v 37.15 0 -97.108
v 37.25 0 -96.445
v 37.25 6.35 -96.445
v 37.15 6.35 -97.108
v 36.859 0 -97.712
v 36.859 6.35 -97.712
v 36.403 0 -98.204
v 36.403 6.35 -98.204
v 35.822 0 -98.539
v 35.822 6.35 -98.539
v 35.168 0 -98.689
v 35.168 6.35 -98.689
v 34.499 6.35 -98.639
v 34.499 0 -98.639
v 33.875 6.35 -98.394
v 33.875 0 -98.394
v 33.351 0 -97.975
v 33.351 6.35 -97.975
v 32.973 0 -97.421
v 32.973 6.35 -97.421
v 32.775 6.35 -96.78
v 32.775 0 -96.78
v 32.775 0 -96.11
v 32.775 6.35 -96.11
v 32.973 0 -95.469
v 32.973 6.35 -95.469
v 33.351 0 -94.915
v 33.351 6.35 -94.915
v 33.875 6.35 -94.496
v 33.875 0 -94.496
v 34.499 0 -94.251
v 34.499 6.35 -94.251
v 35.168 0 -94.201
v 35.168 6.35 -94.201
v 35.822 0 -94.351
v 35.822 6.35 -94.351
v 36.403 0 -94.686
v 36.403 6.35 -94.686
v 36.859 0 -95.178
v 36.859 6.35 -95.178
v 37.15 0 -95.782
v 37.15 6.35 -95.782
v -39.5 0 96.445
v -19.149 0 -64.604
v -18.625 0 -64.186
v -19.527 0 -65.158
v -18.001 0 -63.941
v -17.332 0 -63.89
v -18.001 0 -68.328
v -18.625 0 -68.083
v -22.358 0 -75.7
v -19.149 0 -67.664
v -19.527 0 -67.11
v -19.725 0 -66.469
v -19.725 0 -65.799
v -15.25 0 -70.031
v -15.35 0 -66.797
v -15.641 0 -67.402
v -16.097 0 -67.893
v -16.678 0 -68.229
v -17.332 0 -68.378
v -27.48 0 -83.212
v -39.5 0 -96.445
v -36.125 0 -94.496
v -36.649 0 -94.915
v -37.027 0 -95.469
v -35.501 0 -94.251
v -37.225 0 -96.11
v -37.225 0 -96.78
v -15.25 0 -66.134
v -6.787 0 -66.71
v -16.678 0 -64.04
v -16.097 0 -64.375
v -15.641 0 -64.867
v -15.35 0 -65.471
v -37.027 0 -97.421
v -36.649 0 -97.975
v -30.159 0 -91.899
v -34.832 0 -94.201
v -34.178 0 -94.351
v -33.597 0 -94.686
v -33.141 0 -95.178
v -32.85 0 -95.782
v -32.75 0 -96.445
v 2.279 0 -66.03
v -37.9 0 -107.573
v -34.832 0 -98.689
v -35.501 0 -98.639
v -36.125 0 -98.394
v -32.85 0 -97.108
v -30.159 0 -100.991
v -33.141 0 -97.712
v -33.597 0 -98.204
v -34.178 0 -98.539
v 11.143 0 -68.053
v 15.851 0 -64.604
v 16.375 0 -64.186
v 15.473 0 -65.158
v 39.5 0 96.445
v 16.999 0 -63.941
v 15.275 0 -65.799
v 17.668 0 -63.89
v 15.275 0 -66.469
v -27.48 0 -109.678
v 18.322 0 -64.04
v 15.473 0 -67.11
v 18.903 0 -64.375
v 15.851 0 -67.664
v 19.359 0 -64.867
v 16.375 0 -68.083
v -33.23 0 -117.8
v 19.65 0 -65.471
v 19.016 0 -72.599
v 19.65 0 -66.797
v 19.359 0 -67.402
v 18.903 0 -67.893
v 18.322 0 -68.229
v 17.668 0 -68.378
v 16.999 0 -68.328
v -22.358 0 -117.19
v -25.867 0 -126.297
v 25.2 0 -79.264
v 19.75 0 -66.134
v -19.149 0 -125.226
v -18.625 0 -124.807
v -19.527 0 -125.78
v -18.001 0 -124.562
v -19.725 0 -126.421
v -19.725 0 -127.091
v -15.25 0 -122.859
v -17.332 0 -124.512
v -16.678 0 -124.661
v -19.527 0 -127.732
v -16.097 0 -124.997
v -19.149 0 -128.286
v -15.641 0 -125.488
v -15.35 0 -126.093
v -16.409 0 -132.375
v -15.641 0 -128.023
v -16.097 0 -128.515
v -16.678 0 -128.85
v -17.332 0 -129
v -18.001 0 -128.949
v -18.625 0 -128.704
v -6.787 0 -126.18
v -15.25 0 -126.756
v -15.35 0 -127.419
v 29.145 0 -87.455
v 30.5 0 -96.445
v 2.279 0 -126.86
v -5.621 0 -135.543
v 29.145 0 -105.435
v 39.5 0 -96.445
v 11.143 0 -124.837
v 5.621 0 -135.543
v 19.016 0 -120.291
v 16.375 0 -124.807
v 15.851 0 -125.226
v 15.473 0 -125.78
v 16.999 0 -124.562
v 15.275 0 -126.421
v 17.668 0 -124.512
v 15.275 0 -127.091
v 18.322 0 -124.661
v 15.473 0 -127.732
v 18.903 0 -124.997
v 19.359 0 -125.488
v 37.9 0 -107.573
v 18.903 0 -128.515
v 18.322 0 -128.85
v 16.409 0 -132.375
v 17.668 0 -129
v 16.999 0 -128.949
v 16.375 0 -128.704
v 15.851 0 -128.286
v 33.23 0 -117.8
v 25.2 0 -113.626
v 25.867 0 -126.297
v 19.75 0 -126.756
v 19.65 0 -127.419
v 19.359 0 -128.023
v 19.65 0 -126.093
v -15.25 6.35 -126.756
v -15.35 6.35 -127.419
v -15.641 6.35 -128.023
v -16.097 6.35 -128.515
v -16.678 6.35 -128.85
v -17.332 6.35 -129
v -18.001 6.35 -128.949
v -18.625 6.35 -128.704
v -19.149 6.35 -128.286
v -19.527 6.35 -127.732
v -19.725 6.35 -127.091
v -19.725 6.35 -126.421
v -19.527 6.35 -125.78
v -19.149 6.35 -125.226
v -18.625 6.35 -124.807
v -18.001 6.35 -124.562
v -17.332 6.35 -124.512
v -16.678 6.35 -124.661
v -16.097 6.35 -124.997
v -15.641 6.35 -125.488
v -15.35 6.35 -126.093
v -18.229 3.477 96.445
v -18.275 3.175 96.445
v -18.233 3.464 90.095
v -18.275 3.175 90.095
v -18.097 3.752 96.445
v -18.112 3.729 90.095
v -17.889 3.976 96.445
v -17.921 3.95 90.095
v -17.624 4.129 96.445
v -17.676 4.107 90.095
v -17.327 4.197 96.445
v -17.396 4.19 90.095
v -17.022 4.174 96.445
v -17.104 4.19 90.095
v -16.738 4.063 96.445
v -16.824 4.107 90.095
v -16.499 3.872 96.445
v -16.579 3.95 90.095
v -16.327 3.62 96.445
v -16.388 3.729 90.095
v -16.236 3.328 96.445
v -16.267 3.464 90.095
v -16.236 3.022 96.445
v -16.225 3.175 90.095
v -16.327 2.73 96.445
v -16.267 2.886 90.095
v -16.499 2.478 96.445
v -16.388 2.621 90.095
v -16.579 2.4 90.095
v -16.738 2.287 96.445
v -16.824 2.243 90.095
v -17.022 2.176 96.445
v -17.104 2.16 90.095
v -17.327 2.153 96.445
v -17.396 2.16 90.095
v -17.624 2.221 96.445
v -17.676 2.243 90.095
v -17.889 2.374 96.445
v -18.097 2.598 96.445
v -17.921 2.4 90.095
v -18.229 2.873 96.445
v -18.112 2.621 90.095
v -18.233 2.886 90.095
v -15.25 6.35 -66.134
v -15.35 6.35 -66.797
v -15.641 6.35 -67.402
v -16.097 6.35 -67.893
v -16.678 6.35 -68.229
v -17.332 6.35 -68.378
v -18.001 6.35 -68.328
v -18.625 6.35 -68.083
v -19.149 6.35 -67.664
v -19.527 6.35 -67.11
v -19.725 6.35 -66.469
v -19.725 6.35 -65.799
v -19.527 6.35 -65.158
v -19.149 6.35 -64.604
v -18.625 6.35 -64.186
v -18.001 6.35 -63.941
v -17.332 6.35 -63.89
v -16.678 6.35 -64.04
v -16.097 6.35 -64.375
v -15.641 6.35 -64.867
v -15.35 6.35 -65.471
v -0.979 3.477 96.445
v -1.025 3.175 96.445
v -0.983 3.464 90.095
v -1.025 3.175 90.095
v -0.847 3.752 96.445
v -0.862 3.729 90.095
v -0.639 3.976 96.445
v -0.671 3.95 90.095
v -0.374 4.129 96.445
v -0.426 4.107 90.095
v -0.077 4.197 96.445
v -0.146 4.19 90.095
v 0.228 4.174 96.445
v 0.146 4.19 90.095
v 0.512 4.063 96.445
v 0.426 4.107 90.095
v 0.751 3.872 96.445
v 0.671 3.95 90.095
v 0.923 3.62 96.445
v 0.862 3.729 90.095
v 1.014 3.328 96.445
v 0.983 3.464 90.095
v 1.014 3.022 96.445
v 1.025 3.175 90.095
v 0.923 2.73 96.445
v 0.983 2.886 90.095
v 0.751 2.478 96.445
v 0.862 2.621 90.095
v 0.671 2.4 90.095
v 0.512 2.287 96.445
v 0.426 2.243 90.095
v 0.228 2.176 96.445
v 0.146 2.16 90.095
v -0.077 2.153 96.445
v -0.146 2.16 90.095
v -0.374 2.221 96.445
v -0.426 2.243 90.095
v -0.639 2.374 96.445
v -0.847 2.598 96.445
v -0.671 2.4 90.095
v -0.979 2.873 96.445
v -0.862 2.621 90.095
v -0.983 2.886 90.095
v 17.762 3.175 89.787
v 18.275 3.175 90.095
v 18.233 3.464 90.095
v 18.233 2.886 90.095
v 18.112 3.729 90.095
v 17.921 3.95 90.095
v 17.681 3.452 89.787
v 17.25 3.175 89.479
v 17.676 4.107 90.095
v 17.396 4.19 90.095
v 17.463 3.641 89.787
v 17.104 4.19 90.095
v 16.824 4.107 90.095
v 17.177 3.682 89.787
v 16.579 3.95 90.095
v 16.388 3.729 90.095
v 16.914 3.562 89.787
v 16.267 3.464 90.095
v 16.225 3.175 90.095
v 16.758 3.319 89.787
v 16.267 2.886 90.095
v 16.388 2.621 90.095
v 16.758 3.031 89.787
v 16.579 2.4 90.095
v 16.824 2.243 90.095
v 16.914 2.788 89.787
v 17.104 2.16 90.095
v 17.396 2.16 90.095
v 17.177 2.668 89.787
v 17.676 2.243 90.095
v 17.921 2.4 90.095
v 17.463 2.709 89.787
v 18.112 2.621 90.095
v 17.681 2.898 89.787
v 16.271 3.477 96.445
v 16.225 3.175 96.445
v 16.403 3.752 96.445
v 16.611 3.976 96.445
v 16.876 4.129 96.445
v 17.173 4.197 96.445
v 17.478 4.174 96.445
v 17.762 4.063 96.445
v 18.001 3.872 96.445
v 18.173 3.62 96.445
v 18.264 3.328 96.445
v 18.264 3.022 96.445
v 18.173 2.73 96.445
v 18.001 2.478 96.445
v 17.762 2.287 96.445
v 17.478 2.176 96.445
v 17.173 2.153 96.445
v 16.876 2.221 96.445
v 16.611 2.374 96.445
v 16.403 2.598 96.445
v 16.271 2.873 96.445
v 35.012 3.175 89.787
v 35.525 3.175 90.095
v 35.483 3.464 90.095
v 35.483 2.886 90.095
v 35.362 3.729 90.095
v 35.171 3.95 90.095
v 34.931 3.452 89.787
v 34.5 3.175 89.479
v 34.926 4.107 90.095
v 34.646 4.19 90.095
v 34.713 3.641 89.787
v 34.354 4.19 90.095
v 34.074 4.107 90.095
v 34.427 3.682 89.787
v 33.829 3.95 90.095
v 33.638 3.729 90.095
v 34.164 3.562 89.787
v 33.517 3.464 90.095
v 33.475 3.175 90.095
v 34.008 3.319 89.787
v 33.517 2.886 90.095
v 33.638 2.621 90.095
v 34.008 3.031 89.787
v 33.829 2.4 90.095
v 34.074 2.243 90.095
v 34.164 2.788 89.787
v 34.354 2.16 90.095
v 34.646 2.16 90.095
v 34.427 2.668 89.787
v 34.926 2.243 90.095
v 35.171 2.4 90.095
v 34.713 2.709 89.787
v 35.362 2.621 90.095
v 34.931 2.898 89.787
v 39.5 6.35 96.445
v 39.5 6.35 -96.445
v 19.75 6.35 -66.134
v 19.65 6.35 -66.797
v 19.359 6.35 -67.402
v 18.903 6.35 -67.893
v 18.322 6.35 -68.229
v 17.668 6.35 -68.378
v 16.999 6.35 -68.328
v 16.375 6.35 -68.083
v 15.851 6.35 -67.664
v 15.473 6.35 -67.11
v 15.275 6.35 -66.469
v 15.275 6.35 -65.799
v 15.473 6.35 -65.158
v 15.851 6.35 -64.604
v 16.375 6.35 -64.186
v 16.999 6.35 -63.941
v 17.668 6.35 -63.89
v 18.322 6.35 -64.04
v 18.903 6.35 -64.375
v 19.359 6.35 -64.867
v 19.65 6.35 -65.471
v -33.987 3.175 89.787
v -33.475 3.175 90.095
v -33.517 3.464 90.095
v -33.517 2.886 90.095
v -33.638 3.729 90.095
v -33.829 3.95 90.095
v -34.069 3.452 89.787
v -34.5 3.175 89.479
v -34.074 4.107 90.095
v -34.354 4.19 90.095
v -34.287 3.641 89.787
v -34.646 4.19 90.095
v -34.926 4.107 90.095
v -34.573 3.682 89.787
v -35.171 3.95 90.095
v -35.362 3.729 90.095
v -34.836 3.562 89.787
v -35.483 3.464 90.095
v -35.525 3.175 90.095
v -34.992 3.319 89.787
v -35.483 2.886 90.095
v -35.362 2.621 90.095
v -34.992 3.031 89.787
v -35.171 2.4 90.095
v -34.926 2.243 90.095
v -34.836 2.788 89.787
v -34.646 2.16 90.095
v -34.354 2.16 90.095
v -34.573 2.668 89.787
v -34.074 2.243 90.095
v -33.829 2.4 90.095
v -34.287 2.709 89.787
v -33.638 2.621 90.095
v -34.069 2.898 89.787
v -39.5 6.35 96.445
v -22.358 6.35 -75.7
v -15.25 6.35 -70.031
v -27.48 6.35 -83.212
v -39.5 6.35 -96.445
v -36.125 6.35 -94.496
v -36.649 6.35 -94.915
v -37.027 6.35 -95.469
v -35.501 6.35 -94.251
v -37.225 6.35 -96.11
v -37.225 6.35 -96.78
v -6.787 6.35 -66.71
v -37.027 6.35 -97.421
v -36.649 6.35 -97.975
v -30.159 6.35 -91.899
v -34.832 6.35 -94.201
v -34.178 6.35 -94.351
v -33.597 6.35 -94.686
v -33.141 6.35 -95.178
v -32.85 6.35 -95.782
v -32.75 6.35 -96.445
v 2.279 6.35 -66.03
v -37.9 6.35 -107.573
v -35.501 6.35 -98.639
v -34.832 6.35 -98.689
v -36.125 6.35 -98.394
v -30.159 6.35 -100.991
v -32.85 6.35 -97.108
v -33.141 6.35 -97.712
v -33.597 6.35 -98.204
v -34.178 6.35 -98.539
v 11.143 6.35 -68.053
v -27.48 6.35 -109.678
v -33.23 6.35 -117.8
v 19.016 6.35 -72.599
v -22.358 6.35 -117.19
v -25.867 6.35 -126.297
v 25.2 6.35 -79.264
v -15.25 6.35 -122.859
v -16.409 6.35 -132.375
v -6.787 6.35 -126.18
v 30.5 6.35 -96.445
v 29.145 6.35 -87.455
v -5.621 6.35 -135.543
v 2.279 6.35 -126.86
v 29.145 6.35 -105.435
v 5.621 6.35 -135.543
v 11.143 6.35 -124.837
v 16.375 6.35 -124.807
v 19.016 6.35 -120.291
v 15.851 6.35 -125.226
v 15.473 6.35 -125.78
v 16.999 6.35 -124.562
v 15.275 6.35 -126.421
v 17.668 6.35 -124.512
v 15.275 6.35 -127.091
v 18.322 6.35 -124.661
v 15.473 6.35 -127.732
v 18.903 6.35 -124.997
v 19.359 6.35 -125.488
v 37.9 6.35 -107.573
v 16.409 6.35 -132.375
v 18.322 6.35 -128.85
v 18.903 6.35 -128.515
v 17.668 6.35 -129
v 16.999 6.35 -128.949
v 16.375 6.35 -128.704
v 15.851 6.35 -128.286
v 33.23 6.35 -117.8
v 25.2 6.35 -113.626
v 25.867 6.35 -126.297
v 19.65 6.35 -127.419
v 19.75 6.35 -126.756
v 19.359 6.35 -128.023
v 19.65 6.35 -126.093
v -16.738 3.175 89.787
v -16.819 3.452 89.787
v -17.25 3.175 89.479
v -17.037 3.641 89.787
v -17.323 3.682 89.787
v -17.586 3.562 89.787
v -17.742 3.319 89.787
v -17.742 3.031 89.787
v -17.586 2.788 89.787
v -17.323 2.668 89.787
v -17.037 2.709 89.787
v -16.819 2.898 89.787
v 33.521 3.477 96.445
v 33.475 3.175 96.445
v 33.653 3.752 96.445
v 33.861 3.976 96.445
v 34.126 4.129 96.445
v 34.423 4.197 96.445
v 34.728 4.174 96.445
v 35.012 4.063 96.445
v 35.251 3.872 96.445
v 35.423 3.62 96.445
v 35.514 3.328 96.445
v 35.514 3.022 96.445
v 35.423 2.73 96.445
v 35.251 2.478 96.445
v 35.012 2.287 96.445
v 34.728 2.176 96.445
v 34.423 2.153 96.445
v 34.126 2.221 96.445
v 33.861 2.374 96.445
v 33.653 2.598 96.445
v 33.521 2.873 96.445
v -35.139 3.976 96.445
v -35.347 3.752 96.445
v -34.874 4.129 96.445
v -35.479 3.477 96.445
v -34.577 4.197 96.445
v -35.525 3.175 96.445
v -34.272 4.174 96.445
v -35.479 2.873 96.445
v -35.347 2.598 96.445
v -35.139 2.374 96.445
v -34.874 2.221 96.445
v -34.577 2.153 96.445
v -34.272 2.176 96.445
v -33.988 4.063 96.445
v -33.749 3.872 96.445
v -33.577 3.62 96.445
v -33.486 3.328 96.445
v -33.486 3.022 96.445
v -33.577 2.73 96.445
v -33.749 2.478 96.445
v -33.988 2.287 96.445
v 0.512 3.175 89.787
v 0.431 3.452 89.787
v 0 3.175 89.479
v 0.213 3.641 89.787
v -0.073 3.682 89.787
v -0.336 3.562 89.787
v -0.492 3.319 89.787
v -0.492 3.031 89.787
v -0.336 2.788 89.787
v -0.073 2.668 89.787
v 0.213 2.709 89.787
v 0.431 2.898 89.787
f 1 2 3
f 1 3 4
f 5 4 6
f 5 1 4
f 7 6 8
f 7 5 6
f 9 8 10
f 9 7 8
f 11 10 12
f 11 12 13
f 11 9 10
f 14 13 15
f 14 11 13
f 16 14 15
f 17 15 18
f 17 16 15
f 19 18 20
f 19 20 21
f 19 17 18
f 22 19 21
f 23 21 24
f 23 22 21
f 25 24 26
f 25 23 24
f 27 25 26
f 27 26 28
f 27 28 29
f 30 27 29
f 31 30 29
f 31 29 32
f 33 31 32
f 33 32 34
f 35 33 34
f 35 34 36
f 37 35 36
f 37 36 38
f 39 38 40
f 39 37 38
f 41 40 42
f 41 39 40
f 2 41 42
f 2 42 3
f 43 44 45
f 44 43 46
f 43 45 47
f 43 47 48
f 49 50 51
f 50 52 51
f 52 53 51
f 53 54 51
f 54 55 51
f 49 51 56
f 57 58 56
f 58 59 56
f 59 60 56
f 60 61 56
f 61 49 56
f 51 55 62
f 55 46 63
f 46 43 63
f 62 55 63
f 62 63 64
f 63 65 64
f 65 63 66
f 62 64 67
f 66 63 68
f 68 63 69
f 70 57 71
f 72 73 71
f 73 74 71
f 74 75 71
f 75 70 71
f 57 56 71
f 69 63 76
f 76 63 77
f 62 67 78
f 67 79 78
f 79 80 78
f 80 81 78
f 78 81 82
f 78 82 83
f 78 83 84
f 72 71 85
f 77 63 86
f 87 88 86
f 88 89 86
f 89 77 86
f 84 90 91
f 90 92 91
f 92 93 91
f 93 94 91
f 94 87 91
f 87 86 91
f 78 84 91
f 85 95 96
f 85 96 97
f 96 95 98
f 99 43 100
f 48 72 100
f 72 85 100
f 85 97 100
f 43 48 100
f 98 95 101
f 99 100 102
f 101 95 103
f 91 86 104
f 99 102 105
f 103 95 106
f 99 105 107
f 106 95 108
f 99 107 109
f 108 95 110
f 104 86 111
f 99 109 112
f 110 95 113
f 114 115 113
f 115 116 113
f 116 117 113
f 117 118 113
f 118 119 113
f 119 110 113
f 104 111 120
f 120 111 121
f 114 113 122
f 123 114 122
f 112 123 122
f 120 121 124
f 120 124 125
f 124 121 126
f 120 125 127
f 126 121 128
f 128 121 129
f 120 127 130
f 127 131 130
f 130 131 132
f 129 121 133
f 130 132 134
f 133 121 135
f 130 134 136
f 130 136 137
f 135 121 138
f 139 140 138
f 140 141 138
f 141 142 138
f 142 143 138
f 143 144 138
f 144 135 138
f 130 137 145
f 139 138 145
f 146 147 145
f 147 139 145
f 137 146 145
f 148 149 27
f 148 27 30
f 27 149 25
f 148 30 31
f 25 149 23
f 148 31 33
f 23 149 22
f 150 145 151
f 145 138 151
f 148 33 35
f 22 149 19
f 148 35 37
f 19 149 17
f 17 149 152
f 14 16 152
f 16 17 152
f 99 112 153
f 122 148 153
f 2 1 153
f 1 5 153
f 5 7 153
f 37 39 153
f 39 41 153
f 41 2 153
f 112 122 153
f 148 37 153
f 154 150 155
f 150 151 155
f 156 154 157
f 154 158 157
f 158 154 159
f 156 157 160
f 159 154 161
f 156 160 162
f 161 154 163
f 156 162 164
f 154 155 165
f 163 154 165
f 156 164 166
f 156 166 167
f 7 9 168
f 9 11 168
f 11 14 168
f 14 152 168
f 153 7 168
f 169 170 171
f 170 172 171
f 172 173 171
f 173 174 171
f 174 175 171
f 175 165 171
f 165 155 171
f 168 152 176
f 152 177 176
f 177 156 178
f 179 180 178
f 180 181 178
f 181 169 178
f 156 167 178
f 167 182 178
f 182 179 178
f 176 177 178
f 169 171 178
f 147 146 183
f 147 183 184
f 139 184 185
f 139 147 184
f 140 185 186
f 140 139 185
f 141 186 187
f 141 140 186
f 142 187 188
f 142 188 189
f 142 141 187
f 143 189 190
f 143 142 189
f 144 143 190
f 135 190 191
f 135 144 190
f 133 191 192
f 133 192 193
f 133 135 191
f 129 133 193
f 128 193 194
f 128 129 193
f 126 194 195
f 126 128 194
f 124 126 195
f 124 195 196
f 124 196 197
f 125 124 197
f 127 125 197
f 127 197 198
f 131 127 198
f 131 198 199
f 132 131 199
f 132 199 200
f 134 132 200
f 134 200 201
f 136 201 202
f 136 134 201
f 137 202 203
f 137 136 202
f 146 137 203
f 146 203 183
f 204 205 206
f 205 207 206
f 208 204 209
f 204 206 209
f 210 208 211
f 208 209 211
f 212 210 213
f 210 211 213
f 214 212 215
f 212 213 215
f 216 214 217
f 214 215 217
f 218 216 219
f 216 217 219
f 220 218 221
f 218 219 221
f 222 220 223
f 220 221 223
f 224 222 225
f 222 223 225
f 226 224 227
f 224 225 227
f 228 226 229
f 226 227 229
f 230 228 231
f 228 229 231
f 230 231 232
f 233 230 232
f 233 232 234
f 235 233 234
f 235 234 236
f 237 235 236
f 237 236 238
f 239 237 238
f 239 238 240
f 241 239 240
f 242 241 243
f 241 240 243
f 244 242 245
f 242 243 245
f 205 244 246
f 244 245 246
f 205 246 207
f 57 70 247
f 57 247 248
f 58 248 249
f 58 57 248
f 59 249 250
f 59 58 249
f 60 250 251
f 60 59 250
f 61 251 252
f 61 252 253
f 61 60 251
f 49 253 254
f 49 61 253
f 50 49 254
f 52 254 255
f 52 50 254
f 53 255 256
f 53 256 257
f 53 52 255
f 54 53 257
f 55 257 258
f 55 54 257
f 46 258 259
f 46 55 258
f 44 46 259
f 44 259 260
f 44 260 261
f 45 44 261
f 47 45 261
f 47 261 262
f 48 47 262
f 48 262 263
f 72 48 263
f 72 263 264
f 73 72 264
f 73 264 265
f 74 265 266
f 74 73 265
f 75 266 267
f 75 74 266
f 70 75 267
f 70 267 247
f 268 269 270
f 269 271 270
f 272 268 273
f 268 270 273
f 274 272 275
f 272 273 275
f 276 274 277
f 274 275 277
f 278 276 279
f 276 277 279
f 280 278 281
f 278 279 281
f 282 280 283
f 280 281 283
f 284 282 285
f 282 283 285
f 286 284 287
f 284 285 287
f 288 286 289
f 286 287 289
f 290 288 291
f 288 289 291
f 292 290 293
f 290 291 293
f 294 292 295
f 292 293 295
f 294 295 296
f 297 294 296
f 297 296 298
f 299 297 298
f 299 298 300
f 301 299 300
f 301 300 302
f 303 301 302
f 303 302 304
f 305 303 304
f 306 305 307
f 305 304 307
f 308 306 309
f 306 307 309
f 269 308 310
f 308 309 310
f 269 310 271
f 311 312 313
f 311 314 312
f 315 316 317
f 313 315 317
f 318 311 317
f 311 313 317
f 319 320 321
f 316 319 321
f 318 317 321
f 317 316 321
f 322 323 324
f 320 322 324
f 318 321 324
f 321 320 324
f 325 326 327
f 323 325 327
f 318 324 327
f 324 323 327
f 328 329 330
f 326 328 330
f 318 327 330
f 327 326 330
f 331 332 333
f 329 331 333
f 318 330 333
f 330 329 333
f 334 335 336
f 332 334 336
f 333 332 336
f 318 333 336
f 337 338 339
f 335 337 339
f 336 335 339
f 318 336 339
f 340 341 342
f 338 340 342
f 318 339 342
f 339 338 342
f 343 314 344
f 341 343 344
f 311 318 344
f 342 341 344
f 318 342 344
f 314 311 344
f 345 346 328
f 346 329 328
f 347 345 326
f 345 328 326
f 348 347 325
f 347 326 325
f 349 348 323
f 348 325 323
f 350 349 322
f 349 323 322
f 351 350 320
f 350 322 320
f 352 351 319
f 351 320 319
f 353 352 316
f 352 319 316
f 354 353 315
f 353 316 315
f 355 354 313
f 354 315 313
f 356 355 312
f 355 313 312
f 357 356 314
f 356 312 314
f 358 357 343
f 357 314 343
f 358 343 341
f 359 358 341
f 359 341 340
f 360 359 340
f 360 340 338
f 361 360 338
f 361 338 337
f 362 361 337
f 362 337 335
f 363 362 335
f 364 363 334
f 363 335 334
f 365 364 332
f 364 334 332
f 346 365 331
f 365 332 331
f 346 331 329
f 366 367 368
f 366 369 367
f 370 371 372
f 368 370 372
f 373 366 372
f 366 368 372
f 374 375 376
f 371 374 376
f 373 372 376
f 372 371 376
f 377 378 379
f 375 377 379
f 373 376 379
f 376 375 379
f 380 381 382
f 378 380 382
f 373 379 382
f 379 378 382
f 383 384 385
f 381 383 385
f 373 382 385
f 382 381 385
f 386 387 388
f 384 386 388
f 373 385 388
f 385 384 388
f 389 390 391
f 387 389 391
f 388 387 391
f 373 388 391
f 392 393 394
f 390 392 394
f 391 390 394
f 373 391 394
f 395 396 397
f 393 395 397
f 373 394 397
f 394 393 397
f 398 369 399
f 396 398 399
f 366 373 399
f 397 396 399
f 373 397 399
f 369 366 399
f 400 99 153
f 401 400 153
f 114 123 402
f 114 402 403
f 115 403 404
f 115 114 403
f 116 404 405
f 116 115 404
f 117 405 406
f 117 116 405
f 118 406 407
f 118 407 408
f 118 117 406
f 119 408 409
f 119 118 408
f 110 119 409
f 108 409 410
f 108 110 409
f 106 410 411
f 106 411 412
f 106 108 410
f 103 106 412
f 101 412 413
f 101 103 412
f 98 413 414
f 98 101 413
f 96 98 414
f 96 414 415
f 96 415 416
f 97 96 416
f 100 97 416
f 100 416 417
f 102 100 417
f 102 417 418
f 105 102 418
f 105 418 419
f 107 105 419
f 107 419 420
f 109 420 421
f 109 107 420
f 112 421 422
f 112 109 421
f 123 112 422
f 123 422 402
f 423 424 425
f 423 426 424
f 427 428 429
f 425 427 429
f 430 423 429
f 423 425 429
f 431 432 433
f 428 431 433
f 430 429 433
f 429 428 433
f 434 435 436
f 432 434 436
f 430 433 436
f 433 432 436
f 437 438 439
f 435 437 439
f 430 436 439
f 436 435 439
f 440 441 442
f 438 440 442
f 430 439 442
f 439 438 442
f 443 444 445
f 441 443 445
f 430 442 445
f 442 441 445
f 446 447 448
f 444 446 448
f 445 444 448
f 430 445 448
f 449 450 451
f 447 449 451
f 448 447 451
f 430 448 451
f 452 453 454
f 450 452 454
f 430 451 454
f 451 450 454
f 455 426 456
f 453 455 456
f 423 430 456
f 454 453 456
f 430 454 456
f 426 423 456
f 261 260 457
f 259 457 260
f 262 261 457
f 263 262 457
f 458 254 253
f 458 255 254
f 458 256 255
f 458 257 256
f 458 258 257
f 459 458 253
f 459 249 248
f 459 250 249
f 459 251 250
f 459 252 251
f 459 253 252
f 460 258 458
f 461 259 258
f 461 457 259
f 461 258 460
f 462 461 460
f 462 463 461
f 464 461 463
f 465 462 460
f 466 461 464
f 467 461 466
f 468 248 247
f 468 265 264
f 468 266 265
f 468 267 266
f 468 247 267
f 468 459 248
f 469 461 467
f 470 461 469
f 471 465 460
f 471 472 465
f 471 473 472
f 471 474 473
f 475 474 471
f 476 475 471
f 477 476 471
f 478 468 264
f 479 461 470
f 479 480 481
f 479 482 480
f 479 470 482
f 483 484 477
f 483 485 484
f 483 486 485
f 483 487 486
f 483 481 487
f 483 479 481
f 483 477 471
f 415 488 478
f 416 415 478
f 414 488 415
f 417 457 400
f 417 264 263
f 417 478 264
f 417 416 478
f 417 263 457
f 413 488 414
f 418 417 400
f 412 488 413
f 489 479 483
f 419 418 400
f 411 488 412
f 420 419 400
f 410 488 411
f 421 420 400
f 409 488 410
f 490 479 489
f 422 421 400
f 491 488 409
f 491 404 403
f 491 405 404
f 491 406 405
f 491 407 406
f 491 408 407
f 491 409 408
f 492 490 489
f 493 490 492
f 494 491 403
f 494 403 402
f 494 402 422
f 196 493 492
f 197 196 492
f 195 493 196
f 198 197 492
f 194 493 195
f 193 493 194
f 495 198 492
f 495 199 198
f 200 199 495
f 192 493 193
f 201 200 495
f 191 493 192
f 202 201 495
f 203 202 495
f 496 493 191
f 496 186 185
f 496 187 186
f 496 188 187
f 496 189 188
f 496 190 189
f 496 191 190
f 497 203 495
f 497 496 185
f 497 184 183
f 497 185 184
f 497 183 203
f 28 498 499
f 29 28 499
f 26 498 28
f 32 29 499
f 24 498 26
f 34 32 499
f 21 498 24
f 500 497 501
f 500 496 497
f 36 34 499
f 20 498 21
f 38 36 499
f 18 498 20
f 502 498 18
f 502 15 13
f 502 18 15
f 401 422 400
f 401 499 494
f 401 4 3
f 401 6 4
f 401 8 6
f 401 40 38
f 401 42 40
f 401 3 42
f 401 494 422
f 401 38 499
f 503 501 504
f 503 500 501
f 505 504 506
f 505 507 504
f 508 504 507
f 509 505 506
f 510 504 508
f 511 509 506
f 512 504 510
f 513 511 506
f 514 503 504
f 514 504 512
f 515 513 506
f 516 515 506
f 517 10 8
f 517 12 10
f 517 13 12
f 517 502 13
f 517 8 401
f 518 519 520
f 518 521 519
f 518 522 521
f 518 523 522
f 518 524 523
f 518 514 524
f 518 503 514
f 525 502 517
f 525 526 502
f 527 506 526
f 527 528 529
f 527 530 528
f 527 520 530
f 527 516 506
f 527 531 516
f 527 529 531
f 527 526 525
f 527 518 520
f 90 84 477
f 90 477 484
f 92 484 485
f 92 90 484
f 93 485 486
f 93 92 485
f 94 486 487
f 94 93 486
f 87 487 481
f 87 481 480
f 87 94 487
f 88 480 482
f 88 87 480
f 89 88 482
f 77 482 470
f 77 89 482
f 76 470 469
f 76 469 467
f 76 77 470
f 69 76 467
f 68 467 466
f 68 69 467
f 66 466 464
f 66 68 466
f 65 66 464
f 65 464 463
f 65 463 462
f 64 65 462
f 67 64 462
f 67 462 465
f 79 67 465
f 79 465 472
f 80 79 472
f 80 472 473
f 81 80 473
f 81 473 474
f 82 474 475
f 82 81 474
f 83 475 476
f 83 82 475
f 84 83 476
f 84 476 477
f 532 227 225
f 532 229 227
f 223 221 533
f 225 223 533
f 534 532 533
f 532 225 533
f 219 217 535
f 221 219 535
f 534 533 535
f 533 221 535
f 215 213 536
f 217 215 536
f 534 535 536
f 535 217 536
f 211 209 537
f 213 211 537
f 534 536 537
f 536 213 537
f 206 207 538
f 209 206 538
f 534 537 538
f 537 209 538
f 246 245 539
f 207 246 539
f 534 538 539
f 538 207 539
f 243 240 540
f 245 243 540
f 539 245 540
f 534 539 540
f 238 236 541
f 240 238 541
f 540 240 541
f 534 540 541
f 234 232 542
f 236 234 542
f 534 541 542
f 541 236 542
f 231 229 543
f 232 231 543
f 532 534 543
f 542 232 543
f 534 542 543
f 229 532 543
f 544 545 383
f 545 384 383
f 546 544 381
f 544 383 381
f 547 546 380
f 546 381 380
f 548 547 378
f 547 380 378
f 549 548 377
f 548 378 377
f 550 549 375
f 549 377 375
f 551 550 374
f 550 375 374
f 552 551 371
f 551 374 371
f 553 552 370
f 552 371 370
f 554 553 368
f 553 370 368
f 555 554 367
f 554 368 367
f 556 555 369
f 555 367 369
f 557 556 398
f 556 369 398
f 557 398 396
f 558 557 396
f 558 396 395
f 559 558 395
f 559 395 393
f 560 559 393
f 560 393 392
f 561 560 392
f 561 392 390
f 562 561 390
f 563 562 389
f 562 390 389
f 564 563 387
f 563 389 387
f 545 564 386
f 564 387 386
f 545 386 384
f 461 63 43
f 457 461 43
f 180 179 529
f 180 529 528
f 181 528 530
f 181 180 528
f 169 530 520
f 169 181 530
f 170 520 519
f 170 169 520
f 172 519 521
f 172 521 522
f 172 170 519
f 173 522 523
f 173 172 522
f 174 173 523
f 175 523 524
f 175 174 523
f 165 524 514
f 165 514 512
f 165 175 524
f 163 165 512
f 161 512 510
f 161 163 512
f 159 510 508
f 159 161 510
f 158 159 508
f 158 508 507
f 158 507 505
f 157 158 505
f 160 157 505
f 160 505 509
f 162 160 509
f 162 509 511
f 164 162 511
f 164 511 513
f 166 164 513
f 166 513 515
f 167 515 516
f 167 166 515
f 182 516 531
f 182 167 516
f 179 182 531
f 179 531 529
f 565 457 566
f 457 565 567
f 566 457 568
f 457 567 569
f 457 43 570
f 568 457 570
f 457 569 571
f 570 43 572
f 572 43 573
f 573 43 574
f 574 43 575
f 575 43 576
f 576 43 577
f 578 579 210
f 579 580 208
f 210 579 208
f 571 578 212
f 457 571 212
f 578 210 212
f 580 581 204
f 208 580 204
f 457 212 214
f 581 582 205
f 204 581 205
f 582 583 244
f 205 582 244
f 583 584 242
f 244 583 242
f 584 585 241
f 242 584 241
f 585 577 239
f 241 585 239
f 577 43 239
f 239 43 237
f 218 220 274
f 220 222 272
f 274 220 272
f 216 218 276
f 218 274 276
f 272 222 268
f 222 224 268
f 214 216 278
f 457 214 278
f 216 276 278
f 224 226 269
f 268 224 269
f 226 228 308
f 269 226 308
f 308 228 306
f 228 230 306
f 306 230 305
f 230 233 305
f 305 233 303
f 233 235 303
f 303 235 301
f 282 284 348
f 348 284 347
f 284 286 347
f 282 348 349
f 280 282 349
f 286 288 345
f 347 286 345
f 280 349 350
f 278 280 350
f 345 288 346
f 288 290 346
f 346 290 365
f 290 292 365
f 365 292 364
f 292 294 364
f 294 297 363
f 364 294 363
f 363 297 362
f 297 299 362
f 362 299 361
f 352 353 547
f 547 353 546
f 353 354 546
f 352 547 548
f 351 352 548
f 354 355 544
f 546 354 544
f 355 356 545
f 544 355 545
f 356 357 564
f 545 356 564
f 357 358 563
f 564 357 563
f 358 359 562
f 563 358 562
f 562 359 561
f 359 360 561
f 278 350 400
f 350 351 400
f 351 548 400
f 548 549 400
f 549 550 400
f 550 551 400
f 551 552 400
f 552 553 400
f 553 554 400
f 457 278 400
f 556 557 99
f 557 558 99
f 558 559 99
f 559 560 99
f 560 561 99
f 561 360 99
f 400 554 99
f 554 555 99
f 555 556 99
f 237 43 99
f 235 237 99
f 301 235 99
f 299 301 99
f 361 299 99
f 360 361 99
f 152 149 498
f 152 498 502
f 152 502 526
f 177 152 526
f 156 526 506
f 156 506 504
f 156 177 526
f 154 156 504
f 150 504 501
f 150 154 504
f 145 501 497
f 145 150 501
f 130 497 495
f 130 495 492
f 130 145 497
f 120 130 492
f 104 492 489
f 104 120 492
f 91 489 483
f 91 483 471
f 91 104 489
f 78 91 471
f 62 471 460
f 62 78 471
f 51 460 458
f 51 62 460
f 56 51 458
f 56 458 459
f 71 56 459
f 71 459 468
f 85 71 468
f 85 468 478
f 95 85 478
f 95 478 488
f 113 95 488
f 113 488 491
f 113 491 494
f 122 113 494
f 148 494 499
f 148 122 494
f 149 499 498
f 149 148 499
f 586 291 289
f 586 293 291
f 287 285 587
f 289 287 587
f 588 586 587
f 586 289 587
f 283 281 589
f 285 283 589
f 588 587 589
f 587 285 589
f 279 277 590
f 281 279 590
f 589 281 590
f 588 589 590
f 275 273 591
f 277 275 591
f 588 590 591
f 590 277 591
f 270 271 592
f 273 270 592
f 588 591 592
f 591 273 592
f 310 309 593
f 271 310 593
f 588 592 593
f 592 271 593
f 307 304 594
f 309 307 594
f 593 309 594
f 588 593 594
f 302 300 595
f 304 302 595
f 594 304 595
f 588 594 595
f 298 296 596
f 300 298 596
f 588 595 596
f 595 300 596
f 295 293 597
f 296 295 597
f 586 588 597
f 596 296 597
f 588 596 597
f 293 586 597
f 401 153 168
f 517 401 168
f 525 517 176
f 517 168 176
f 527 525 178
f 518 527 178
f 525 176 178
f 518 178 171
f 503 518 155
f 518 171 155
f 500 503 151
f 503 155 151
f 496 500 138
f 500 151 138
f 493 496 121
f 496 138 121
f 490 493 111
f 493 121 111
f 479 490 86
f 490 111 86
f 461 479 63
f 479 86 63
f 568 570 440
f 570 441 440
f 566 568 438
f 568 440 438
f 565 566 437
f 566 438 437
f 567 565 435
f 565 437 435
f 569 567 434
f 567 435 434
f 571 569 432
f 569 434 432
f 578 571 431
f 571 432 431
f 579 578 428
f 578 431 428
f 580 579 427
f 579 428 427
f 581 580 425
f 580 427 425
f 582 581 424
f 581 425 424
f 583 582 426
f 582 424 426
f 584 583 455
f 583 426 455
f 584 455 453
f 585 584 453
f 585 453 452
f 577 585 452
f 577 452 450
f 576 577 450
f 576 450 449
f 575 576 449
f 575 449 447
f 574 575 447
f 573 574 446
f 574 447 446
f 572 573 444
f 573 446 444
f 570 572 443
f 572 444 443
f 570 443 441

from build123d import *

# Parameters (mm, degrees)
BOSS_EXTRUDE1_OUTLINE_R      = 2.25
BOSS_EXTRUDE1_OUTLINE_R_2    = 30.5
BOSS_EXTRUDE1_DEPTH          = 6.35
M2_5X0_45_TAPPED_HOLE1_D     = 2.05
M2_5X0_45_TAPPED_HOLE1_DEPTH = 6.35
M2_5X0_45_TAPPED_HOLE1_TIP   = 0.615882135


# Read off the part's stored shape, not the designer's step: Boss-Extrude1
with BuildPart() as part:
    # Boss-Extrude1 outline → Boss-Extrude1 (new body)
    with BuildSketch(Plane(origin=(0, 0, 0), x_dir=(1, 0, 0), z_dir=(0, 1, 0))):
        with BuildLine():
            ThreePointArc((39.5, 96.444999522), (2.39e-07, 135.945), (-39.5, 96.445))
            Line((-39.5, 96.445), (-39.500001167, -96.445))
            Line((-39.500001167, -96.445), (39.499998833, -96.445000478))
            Line((39.499998833, -96.445000478), (39.5, 96.444999522))
        make_face()
        with Locations((-17.5, 66.134110868)):
            Circle(BOSS_EXTRUDE1_OUTLINE_R, mode=Mode.SUBTRACT)
        with Locations((-35, 96.445)):
            Circle(BOSS_EXTRUDE1_OUTLINE_R, mode=Mode.SUBTRACT)
        with Locations((-17.5, 126.755889132)):
            Circle(BOSS_EXTRUDE1_OUTLINE_R, mode=Mode.SUBTRACT)
        with Locations((17.5, 66.134110868)):
            Circle(BOSS_EXTRUDE1_OUTLINE_R, mode=Mode.SUBTRACT)
        with Locations((0, 96.445)):
            Circle(BOSS_EXTRUDE1_OUTLINE_R_2, mode=Mode.SUBTRACT)
        with Locations((17.5, 126.755889132)):
            Circle(BOSS_EXTRUDE1_OUTLINE_R, mode=Mode.SUBTRACT)
        with Locations((35, 96.445)):
            Circle(BOSS_EXTRUDE1_OUTLINE_R, mode=Mode.SUBTRACT)
    extrude(amount=BOSS_EXTRUDE1_DEPTH)

    # M2.5x0.45 Tapped Hole1
    with Locations(Plane(origin=(-5.84e-07, 0, 96.445000239), x_dir=(1.0, 0, 6.0503381489132905e-09), z_dir=(-6.0503381489132905e-09, 0, 1.0))):
        with Locations((0, 3.175), (17.249999708, 3.175), (34.499999416, 3.175), (-17.249999708, 3.175), (-34.499999416, 3.175)):
            Hole(M2_5X0_45_TAPPED_HOLE1_D / 2, depth=M2_5X0_45_TAPPED_HOLE1_DEPTH)
            with Locations((0, 0, -(M2_5X0_45_TAPPED_HOLE1_DEPTH + M2_5X0_45_TAPPED_HOLE1_TIP / 2))):  # 118° drill point
                Cone(0, M2_5X0_45_TAPPED_HOLE1_D / 2, M2_5X0_45_TAPPED_HOLE1_TIP, mode=Mode.SUBTRACT)


solid = part.part
